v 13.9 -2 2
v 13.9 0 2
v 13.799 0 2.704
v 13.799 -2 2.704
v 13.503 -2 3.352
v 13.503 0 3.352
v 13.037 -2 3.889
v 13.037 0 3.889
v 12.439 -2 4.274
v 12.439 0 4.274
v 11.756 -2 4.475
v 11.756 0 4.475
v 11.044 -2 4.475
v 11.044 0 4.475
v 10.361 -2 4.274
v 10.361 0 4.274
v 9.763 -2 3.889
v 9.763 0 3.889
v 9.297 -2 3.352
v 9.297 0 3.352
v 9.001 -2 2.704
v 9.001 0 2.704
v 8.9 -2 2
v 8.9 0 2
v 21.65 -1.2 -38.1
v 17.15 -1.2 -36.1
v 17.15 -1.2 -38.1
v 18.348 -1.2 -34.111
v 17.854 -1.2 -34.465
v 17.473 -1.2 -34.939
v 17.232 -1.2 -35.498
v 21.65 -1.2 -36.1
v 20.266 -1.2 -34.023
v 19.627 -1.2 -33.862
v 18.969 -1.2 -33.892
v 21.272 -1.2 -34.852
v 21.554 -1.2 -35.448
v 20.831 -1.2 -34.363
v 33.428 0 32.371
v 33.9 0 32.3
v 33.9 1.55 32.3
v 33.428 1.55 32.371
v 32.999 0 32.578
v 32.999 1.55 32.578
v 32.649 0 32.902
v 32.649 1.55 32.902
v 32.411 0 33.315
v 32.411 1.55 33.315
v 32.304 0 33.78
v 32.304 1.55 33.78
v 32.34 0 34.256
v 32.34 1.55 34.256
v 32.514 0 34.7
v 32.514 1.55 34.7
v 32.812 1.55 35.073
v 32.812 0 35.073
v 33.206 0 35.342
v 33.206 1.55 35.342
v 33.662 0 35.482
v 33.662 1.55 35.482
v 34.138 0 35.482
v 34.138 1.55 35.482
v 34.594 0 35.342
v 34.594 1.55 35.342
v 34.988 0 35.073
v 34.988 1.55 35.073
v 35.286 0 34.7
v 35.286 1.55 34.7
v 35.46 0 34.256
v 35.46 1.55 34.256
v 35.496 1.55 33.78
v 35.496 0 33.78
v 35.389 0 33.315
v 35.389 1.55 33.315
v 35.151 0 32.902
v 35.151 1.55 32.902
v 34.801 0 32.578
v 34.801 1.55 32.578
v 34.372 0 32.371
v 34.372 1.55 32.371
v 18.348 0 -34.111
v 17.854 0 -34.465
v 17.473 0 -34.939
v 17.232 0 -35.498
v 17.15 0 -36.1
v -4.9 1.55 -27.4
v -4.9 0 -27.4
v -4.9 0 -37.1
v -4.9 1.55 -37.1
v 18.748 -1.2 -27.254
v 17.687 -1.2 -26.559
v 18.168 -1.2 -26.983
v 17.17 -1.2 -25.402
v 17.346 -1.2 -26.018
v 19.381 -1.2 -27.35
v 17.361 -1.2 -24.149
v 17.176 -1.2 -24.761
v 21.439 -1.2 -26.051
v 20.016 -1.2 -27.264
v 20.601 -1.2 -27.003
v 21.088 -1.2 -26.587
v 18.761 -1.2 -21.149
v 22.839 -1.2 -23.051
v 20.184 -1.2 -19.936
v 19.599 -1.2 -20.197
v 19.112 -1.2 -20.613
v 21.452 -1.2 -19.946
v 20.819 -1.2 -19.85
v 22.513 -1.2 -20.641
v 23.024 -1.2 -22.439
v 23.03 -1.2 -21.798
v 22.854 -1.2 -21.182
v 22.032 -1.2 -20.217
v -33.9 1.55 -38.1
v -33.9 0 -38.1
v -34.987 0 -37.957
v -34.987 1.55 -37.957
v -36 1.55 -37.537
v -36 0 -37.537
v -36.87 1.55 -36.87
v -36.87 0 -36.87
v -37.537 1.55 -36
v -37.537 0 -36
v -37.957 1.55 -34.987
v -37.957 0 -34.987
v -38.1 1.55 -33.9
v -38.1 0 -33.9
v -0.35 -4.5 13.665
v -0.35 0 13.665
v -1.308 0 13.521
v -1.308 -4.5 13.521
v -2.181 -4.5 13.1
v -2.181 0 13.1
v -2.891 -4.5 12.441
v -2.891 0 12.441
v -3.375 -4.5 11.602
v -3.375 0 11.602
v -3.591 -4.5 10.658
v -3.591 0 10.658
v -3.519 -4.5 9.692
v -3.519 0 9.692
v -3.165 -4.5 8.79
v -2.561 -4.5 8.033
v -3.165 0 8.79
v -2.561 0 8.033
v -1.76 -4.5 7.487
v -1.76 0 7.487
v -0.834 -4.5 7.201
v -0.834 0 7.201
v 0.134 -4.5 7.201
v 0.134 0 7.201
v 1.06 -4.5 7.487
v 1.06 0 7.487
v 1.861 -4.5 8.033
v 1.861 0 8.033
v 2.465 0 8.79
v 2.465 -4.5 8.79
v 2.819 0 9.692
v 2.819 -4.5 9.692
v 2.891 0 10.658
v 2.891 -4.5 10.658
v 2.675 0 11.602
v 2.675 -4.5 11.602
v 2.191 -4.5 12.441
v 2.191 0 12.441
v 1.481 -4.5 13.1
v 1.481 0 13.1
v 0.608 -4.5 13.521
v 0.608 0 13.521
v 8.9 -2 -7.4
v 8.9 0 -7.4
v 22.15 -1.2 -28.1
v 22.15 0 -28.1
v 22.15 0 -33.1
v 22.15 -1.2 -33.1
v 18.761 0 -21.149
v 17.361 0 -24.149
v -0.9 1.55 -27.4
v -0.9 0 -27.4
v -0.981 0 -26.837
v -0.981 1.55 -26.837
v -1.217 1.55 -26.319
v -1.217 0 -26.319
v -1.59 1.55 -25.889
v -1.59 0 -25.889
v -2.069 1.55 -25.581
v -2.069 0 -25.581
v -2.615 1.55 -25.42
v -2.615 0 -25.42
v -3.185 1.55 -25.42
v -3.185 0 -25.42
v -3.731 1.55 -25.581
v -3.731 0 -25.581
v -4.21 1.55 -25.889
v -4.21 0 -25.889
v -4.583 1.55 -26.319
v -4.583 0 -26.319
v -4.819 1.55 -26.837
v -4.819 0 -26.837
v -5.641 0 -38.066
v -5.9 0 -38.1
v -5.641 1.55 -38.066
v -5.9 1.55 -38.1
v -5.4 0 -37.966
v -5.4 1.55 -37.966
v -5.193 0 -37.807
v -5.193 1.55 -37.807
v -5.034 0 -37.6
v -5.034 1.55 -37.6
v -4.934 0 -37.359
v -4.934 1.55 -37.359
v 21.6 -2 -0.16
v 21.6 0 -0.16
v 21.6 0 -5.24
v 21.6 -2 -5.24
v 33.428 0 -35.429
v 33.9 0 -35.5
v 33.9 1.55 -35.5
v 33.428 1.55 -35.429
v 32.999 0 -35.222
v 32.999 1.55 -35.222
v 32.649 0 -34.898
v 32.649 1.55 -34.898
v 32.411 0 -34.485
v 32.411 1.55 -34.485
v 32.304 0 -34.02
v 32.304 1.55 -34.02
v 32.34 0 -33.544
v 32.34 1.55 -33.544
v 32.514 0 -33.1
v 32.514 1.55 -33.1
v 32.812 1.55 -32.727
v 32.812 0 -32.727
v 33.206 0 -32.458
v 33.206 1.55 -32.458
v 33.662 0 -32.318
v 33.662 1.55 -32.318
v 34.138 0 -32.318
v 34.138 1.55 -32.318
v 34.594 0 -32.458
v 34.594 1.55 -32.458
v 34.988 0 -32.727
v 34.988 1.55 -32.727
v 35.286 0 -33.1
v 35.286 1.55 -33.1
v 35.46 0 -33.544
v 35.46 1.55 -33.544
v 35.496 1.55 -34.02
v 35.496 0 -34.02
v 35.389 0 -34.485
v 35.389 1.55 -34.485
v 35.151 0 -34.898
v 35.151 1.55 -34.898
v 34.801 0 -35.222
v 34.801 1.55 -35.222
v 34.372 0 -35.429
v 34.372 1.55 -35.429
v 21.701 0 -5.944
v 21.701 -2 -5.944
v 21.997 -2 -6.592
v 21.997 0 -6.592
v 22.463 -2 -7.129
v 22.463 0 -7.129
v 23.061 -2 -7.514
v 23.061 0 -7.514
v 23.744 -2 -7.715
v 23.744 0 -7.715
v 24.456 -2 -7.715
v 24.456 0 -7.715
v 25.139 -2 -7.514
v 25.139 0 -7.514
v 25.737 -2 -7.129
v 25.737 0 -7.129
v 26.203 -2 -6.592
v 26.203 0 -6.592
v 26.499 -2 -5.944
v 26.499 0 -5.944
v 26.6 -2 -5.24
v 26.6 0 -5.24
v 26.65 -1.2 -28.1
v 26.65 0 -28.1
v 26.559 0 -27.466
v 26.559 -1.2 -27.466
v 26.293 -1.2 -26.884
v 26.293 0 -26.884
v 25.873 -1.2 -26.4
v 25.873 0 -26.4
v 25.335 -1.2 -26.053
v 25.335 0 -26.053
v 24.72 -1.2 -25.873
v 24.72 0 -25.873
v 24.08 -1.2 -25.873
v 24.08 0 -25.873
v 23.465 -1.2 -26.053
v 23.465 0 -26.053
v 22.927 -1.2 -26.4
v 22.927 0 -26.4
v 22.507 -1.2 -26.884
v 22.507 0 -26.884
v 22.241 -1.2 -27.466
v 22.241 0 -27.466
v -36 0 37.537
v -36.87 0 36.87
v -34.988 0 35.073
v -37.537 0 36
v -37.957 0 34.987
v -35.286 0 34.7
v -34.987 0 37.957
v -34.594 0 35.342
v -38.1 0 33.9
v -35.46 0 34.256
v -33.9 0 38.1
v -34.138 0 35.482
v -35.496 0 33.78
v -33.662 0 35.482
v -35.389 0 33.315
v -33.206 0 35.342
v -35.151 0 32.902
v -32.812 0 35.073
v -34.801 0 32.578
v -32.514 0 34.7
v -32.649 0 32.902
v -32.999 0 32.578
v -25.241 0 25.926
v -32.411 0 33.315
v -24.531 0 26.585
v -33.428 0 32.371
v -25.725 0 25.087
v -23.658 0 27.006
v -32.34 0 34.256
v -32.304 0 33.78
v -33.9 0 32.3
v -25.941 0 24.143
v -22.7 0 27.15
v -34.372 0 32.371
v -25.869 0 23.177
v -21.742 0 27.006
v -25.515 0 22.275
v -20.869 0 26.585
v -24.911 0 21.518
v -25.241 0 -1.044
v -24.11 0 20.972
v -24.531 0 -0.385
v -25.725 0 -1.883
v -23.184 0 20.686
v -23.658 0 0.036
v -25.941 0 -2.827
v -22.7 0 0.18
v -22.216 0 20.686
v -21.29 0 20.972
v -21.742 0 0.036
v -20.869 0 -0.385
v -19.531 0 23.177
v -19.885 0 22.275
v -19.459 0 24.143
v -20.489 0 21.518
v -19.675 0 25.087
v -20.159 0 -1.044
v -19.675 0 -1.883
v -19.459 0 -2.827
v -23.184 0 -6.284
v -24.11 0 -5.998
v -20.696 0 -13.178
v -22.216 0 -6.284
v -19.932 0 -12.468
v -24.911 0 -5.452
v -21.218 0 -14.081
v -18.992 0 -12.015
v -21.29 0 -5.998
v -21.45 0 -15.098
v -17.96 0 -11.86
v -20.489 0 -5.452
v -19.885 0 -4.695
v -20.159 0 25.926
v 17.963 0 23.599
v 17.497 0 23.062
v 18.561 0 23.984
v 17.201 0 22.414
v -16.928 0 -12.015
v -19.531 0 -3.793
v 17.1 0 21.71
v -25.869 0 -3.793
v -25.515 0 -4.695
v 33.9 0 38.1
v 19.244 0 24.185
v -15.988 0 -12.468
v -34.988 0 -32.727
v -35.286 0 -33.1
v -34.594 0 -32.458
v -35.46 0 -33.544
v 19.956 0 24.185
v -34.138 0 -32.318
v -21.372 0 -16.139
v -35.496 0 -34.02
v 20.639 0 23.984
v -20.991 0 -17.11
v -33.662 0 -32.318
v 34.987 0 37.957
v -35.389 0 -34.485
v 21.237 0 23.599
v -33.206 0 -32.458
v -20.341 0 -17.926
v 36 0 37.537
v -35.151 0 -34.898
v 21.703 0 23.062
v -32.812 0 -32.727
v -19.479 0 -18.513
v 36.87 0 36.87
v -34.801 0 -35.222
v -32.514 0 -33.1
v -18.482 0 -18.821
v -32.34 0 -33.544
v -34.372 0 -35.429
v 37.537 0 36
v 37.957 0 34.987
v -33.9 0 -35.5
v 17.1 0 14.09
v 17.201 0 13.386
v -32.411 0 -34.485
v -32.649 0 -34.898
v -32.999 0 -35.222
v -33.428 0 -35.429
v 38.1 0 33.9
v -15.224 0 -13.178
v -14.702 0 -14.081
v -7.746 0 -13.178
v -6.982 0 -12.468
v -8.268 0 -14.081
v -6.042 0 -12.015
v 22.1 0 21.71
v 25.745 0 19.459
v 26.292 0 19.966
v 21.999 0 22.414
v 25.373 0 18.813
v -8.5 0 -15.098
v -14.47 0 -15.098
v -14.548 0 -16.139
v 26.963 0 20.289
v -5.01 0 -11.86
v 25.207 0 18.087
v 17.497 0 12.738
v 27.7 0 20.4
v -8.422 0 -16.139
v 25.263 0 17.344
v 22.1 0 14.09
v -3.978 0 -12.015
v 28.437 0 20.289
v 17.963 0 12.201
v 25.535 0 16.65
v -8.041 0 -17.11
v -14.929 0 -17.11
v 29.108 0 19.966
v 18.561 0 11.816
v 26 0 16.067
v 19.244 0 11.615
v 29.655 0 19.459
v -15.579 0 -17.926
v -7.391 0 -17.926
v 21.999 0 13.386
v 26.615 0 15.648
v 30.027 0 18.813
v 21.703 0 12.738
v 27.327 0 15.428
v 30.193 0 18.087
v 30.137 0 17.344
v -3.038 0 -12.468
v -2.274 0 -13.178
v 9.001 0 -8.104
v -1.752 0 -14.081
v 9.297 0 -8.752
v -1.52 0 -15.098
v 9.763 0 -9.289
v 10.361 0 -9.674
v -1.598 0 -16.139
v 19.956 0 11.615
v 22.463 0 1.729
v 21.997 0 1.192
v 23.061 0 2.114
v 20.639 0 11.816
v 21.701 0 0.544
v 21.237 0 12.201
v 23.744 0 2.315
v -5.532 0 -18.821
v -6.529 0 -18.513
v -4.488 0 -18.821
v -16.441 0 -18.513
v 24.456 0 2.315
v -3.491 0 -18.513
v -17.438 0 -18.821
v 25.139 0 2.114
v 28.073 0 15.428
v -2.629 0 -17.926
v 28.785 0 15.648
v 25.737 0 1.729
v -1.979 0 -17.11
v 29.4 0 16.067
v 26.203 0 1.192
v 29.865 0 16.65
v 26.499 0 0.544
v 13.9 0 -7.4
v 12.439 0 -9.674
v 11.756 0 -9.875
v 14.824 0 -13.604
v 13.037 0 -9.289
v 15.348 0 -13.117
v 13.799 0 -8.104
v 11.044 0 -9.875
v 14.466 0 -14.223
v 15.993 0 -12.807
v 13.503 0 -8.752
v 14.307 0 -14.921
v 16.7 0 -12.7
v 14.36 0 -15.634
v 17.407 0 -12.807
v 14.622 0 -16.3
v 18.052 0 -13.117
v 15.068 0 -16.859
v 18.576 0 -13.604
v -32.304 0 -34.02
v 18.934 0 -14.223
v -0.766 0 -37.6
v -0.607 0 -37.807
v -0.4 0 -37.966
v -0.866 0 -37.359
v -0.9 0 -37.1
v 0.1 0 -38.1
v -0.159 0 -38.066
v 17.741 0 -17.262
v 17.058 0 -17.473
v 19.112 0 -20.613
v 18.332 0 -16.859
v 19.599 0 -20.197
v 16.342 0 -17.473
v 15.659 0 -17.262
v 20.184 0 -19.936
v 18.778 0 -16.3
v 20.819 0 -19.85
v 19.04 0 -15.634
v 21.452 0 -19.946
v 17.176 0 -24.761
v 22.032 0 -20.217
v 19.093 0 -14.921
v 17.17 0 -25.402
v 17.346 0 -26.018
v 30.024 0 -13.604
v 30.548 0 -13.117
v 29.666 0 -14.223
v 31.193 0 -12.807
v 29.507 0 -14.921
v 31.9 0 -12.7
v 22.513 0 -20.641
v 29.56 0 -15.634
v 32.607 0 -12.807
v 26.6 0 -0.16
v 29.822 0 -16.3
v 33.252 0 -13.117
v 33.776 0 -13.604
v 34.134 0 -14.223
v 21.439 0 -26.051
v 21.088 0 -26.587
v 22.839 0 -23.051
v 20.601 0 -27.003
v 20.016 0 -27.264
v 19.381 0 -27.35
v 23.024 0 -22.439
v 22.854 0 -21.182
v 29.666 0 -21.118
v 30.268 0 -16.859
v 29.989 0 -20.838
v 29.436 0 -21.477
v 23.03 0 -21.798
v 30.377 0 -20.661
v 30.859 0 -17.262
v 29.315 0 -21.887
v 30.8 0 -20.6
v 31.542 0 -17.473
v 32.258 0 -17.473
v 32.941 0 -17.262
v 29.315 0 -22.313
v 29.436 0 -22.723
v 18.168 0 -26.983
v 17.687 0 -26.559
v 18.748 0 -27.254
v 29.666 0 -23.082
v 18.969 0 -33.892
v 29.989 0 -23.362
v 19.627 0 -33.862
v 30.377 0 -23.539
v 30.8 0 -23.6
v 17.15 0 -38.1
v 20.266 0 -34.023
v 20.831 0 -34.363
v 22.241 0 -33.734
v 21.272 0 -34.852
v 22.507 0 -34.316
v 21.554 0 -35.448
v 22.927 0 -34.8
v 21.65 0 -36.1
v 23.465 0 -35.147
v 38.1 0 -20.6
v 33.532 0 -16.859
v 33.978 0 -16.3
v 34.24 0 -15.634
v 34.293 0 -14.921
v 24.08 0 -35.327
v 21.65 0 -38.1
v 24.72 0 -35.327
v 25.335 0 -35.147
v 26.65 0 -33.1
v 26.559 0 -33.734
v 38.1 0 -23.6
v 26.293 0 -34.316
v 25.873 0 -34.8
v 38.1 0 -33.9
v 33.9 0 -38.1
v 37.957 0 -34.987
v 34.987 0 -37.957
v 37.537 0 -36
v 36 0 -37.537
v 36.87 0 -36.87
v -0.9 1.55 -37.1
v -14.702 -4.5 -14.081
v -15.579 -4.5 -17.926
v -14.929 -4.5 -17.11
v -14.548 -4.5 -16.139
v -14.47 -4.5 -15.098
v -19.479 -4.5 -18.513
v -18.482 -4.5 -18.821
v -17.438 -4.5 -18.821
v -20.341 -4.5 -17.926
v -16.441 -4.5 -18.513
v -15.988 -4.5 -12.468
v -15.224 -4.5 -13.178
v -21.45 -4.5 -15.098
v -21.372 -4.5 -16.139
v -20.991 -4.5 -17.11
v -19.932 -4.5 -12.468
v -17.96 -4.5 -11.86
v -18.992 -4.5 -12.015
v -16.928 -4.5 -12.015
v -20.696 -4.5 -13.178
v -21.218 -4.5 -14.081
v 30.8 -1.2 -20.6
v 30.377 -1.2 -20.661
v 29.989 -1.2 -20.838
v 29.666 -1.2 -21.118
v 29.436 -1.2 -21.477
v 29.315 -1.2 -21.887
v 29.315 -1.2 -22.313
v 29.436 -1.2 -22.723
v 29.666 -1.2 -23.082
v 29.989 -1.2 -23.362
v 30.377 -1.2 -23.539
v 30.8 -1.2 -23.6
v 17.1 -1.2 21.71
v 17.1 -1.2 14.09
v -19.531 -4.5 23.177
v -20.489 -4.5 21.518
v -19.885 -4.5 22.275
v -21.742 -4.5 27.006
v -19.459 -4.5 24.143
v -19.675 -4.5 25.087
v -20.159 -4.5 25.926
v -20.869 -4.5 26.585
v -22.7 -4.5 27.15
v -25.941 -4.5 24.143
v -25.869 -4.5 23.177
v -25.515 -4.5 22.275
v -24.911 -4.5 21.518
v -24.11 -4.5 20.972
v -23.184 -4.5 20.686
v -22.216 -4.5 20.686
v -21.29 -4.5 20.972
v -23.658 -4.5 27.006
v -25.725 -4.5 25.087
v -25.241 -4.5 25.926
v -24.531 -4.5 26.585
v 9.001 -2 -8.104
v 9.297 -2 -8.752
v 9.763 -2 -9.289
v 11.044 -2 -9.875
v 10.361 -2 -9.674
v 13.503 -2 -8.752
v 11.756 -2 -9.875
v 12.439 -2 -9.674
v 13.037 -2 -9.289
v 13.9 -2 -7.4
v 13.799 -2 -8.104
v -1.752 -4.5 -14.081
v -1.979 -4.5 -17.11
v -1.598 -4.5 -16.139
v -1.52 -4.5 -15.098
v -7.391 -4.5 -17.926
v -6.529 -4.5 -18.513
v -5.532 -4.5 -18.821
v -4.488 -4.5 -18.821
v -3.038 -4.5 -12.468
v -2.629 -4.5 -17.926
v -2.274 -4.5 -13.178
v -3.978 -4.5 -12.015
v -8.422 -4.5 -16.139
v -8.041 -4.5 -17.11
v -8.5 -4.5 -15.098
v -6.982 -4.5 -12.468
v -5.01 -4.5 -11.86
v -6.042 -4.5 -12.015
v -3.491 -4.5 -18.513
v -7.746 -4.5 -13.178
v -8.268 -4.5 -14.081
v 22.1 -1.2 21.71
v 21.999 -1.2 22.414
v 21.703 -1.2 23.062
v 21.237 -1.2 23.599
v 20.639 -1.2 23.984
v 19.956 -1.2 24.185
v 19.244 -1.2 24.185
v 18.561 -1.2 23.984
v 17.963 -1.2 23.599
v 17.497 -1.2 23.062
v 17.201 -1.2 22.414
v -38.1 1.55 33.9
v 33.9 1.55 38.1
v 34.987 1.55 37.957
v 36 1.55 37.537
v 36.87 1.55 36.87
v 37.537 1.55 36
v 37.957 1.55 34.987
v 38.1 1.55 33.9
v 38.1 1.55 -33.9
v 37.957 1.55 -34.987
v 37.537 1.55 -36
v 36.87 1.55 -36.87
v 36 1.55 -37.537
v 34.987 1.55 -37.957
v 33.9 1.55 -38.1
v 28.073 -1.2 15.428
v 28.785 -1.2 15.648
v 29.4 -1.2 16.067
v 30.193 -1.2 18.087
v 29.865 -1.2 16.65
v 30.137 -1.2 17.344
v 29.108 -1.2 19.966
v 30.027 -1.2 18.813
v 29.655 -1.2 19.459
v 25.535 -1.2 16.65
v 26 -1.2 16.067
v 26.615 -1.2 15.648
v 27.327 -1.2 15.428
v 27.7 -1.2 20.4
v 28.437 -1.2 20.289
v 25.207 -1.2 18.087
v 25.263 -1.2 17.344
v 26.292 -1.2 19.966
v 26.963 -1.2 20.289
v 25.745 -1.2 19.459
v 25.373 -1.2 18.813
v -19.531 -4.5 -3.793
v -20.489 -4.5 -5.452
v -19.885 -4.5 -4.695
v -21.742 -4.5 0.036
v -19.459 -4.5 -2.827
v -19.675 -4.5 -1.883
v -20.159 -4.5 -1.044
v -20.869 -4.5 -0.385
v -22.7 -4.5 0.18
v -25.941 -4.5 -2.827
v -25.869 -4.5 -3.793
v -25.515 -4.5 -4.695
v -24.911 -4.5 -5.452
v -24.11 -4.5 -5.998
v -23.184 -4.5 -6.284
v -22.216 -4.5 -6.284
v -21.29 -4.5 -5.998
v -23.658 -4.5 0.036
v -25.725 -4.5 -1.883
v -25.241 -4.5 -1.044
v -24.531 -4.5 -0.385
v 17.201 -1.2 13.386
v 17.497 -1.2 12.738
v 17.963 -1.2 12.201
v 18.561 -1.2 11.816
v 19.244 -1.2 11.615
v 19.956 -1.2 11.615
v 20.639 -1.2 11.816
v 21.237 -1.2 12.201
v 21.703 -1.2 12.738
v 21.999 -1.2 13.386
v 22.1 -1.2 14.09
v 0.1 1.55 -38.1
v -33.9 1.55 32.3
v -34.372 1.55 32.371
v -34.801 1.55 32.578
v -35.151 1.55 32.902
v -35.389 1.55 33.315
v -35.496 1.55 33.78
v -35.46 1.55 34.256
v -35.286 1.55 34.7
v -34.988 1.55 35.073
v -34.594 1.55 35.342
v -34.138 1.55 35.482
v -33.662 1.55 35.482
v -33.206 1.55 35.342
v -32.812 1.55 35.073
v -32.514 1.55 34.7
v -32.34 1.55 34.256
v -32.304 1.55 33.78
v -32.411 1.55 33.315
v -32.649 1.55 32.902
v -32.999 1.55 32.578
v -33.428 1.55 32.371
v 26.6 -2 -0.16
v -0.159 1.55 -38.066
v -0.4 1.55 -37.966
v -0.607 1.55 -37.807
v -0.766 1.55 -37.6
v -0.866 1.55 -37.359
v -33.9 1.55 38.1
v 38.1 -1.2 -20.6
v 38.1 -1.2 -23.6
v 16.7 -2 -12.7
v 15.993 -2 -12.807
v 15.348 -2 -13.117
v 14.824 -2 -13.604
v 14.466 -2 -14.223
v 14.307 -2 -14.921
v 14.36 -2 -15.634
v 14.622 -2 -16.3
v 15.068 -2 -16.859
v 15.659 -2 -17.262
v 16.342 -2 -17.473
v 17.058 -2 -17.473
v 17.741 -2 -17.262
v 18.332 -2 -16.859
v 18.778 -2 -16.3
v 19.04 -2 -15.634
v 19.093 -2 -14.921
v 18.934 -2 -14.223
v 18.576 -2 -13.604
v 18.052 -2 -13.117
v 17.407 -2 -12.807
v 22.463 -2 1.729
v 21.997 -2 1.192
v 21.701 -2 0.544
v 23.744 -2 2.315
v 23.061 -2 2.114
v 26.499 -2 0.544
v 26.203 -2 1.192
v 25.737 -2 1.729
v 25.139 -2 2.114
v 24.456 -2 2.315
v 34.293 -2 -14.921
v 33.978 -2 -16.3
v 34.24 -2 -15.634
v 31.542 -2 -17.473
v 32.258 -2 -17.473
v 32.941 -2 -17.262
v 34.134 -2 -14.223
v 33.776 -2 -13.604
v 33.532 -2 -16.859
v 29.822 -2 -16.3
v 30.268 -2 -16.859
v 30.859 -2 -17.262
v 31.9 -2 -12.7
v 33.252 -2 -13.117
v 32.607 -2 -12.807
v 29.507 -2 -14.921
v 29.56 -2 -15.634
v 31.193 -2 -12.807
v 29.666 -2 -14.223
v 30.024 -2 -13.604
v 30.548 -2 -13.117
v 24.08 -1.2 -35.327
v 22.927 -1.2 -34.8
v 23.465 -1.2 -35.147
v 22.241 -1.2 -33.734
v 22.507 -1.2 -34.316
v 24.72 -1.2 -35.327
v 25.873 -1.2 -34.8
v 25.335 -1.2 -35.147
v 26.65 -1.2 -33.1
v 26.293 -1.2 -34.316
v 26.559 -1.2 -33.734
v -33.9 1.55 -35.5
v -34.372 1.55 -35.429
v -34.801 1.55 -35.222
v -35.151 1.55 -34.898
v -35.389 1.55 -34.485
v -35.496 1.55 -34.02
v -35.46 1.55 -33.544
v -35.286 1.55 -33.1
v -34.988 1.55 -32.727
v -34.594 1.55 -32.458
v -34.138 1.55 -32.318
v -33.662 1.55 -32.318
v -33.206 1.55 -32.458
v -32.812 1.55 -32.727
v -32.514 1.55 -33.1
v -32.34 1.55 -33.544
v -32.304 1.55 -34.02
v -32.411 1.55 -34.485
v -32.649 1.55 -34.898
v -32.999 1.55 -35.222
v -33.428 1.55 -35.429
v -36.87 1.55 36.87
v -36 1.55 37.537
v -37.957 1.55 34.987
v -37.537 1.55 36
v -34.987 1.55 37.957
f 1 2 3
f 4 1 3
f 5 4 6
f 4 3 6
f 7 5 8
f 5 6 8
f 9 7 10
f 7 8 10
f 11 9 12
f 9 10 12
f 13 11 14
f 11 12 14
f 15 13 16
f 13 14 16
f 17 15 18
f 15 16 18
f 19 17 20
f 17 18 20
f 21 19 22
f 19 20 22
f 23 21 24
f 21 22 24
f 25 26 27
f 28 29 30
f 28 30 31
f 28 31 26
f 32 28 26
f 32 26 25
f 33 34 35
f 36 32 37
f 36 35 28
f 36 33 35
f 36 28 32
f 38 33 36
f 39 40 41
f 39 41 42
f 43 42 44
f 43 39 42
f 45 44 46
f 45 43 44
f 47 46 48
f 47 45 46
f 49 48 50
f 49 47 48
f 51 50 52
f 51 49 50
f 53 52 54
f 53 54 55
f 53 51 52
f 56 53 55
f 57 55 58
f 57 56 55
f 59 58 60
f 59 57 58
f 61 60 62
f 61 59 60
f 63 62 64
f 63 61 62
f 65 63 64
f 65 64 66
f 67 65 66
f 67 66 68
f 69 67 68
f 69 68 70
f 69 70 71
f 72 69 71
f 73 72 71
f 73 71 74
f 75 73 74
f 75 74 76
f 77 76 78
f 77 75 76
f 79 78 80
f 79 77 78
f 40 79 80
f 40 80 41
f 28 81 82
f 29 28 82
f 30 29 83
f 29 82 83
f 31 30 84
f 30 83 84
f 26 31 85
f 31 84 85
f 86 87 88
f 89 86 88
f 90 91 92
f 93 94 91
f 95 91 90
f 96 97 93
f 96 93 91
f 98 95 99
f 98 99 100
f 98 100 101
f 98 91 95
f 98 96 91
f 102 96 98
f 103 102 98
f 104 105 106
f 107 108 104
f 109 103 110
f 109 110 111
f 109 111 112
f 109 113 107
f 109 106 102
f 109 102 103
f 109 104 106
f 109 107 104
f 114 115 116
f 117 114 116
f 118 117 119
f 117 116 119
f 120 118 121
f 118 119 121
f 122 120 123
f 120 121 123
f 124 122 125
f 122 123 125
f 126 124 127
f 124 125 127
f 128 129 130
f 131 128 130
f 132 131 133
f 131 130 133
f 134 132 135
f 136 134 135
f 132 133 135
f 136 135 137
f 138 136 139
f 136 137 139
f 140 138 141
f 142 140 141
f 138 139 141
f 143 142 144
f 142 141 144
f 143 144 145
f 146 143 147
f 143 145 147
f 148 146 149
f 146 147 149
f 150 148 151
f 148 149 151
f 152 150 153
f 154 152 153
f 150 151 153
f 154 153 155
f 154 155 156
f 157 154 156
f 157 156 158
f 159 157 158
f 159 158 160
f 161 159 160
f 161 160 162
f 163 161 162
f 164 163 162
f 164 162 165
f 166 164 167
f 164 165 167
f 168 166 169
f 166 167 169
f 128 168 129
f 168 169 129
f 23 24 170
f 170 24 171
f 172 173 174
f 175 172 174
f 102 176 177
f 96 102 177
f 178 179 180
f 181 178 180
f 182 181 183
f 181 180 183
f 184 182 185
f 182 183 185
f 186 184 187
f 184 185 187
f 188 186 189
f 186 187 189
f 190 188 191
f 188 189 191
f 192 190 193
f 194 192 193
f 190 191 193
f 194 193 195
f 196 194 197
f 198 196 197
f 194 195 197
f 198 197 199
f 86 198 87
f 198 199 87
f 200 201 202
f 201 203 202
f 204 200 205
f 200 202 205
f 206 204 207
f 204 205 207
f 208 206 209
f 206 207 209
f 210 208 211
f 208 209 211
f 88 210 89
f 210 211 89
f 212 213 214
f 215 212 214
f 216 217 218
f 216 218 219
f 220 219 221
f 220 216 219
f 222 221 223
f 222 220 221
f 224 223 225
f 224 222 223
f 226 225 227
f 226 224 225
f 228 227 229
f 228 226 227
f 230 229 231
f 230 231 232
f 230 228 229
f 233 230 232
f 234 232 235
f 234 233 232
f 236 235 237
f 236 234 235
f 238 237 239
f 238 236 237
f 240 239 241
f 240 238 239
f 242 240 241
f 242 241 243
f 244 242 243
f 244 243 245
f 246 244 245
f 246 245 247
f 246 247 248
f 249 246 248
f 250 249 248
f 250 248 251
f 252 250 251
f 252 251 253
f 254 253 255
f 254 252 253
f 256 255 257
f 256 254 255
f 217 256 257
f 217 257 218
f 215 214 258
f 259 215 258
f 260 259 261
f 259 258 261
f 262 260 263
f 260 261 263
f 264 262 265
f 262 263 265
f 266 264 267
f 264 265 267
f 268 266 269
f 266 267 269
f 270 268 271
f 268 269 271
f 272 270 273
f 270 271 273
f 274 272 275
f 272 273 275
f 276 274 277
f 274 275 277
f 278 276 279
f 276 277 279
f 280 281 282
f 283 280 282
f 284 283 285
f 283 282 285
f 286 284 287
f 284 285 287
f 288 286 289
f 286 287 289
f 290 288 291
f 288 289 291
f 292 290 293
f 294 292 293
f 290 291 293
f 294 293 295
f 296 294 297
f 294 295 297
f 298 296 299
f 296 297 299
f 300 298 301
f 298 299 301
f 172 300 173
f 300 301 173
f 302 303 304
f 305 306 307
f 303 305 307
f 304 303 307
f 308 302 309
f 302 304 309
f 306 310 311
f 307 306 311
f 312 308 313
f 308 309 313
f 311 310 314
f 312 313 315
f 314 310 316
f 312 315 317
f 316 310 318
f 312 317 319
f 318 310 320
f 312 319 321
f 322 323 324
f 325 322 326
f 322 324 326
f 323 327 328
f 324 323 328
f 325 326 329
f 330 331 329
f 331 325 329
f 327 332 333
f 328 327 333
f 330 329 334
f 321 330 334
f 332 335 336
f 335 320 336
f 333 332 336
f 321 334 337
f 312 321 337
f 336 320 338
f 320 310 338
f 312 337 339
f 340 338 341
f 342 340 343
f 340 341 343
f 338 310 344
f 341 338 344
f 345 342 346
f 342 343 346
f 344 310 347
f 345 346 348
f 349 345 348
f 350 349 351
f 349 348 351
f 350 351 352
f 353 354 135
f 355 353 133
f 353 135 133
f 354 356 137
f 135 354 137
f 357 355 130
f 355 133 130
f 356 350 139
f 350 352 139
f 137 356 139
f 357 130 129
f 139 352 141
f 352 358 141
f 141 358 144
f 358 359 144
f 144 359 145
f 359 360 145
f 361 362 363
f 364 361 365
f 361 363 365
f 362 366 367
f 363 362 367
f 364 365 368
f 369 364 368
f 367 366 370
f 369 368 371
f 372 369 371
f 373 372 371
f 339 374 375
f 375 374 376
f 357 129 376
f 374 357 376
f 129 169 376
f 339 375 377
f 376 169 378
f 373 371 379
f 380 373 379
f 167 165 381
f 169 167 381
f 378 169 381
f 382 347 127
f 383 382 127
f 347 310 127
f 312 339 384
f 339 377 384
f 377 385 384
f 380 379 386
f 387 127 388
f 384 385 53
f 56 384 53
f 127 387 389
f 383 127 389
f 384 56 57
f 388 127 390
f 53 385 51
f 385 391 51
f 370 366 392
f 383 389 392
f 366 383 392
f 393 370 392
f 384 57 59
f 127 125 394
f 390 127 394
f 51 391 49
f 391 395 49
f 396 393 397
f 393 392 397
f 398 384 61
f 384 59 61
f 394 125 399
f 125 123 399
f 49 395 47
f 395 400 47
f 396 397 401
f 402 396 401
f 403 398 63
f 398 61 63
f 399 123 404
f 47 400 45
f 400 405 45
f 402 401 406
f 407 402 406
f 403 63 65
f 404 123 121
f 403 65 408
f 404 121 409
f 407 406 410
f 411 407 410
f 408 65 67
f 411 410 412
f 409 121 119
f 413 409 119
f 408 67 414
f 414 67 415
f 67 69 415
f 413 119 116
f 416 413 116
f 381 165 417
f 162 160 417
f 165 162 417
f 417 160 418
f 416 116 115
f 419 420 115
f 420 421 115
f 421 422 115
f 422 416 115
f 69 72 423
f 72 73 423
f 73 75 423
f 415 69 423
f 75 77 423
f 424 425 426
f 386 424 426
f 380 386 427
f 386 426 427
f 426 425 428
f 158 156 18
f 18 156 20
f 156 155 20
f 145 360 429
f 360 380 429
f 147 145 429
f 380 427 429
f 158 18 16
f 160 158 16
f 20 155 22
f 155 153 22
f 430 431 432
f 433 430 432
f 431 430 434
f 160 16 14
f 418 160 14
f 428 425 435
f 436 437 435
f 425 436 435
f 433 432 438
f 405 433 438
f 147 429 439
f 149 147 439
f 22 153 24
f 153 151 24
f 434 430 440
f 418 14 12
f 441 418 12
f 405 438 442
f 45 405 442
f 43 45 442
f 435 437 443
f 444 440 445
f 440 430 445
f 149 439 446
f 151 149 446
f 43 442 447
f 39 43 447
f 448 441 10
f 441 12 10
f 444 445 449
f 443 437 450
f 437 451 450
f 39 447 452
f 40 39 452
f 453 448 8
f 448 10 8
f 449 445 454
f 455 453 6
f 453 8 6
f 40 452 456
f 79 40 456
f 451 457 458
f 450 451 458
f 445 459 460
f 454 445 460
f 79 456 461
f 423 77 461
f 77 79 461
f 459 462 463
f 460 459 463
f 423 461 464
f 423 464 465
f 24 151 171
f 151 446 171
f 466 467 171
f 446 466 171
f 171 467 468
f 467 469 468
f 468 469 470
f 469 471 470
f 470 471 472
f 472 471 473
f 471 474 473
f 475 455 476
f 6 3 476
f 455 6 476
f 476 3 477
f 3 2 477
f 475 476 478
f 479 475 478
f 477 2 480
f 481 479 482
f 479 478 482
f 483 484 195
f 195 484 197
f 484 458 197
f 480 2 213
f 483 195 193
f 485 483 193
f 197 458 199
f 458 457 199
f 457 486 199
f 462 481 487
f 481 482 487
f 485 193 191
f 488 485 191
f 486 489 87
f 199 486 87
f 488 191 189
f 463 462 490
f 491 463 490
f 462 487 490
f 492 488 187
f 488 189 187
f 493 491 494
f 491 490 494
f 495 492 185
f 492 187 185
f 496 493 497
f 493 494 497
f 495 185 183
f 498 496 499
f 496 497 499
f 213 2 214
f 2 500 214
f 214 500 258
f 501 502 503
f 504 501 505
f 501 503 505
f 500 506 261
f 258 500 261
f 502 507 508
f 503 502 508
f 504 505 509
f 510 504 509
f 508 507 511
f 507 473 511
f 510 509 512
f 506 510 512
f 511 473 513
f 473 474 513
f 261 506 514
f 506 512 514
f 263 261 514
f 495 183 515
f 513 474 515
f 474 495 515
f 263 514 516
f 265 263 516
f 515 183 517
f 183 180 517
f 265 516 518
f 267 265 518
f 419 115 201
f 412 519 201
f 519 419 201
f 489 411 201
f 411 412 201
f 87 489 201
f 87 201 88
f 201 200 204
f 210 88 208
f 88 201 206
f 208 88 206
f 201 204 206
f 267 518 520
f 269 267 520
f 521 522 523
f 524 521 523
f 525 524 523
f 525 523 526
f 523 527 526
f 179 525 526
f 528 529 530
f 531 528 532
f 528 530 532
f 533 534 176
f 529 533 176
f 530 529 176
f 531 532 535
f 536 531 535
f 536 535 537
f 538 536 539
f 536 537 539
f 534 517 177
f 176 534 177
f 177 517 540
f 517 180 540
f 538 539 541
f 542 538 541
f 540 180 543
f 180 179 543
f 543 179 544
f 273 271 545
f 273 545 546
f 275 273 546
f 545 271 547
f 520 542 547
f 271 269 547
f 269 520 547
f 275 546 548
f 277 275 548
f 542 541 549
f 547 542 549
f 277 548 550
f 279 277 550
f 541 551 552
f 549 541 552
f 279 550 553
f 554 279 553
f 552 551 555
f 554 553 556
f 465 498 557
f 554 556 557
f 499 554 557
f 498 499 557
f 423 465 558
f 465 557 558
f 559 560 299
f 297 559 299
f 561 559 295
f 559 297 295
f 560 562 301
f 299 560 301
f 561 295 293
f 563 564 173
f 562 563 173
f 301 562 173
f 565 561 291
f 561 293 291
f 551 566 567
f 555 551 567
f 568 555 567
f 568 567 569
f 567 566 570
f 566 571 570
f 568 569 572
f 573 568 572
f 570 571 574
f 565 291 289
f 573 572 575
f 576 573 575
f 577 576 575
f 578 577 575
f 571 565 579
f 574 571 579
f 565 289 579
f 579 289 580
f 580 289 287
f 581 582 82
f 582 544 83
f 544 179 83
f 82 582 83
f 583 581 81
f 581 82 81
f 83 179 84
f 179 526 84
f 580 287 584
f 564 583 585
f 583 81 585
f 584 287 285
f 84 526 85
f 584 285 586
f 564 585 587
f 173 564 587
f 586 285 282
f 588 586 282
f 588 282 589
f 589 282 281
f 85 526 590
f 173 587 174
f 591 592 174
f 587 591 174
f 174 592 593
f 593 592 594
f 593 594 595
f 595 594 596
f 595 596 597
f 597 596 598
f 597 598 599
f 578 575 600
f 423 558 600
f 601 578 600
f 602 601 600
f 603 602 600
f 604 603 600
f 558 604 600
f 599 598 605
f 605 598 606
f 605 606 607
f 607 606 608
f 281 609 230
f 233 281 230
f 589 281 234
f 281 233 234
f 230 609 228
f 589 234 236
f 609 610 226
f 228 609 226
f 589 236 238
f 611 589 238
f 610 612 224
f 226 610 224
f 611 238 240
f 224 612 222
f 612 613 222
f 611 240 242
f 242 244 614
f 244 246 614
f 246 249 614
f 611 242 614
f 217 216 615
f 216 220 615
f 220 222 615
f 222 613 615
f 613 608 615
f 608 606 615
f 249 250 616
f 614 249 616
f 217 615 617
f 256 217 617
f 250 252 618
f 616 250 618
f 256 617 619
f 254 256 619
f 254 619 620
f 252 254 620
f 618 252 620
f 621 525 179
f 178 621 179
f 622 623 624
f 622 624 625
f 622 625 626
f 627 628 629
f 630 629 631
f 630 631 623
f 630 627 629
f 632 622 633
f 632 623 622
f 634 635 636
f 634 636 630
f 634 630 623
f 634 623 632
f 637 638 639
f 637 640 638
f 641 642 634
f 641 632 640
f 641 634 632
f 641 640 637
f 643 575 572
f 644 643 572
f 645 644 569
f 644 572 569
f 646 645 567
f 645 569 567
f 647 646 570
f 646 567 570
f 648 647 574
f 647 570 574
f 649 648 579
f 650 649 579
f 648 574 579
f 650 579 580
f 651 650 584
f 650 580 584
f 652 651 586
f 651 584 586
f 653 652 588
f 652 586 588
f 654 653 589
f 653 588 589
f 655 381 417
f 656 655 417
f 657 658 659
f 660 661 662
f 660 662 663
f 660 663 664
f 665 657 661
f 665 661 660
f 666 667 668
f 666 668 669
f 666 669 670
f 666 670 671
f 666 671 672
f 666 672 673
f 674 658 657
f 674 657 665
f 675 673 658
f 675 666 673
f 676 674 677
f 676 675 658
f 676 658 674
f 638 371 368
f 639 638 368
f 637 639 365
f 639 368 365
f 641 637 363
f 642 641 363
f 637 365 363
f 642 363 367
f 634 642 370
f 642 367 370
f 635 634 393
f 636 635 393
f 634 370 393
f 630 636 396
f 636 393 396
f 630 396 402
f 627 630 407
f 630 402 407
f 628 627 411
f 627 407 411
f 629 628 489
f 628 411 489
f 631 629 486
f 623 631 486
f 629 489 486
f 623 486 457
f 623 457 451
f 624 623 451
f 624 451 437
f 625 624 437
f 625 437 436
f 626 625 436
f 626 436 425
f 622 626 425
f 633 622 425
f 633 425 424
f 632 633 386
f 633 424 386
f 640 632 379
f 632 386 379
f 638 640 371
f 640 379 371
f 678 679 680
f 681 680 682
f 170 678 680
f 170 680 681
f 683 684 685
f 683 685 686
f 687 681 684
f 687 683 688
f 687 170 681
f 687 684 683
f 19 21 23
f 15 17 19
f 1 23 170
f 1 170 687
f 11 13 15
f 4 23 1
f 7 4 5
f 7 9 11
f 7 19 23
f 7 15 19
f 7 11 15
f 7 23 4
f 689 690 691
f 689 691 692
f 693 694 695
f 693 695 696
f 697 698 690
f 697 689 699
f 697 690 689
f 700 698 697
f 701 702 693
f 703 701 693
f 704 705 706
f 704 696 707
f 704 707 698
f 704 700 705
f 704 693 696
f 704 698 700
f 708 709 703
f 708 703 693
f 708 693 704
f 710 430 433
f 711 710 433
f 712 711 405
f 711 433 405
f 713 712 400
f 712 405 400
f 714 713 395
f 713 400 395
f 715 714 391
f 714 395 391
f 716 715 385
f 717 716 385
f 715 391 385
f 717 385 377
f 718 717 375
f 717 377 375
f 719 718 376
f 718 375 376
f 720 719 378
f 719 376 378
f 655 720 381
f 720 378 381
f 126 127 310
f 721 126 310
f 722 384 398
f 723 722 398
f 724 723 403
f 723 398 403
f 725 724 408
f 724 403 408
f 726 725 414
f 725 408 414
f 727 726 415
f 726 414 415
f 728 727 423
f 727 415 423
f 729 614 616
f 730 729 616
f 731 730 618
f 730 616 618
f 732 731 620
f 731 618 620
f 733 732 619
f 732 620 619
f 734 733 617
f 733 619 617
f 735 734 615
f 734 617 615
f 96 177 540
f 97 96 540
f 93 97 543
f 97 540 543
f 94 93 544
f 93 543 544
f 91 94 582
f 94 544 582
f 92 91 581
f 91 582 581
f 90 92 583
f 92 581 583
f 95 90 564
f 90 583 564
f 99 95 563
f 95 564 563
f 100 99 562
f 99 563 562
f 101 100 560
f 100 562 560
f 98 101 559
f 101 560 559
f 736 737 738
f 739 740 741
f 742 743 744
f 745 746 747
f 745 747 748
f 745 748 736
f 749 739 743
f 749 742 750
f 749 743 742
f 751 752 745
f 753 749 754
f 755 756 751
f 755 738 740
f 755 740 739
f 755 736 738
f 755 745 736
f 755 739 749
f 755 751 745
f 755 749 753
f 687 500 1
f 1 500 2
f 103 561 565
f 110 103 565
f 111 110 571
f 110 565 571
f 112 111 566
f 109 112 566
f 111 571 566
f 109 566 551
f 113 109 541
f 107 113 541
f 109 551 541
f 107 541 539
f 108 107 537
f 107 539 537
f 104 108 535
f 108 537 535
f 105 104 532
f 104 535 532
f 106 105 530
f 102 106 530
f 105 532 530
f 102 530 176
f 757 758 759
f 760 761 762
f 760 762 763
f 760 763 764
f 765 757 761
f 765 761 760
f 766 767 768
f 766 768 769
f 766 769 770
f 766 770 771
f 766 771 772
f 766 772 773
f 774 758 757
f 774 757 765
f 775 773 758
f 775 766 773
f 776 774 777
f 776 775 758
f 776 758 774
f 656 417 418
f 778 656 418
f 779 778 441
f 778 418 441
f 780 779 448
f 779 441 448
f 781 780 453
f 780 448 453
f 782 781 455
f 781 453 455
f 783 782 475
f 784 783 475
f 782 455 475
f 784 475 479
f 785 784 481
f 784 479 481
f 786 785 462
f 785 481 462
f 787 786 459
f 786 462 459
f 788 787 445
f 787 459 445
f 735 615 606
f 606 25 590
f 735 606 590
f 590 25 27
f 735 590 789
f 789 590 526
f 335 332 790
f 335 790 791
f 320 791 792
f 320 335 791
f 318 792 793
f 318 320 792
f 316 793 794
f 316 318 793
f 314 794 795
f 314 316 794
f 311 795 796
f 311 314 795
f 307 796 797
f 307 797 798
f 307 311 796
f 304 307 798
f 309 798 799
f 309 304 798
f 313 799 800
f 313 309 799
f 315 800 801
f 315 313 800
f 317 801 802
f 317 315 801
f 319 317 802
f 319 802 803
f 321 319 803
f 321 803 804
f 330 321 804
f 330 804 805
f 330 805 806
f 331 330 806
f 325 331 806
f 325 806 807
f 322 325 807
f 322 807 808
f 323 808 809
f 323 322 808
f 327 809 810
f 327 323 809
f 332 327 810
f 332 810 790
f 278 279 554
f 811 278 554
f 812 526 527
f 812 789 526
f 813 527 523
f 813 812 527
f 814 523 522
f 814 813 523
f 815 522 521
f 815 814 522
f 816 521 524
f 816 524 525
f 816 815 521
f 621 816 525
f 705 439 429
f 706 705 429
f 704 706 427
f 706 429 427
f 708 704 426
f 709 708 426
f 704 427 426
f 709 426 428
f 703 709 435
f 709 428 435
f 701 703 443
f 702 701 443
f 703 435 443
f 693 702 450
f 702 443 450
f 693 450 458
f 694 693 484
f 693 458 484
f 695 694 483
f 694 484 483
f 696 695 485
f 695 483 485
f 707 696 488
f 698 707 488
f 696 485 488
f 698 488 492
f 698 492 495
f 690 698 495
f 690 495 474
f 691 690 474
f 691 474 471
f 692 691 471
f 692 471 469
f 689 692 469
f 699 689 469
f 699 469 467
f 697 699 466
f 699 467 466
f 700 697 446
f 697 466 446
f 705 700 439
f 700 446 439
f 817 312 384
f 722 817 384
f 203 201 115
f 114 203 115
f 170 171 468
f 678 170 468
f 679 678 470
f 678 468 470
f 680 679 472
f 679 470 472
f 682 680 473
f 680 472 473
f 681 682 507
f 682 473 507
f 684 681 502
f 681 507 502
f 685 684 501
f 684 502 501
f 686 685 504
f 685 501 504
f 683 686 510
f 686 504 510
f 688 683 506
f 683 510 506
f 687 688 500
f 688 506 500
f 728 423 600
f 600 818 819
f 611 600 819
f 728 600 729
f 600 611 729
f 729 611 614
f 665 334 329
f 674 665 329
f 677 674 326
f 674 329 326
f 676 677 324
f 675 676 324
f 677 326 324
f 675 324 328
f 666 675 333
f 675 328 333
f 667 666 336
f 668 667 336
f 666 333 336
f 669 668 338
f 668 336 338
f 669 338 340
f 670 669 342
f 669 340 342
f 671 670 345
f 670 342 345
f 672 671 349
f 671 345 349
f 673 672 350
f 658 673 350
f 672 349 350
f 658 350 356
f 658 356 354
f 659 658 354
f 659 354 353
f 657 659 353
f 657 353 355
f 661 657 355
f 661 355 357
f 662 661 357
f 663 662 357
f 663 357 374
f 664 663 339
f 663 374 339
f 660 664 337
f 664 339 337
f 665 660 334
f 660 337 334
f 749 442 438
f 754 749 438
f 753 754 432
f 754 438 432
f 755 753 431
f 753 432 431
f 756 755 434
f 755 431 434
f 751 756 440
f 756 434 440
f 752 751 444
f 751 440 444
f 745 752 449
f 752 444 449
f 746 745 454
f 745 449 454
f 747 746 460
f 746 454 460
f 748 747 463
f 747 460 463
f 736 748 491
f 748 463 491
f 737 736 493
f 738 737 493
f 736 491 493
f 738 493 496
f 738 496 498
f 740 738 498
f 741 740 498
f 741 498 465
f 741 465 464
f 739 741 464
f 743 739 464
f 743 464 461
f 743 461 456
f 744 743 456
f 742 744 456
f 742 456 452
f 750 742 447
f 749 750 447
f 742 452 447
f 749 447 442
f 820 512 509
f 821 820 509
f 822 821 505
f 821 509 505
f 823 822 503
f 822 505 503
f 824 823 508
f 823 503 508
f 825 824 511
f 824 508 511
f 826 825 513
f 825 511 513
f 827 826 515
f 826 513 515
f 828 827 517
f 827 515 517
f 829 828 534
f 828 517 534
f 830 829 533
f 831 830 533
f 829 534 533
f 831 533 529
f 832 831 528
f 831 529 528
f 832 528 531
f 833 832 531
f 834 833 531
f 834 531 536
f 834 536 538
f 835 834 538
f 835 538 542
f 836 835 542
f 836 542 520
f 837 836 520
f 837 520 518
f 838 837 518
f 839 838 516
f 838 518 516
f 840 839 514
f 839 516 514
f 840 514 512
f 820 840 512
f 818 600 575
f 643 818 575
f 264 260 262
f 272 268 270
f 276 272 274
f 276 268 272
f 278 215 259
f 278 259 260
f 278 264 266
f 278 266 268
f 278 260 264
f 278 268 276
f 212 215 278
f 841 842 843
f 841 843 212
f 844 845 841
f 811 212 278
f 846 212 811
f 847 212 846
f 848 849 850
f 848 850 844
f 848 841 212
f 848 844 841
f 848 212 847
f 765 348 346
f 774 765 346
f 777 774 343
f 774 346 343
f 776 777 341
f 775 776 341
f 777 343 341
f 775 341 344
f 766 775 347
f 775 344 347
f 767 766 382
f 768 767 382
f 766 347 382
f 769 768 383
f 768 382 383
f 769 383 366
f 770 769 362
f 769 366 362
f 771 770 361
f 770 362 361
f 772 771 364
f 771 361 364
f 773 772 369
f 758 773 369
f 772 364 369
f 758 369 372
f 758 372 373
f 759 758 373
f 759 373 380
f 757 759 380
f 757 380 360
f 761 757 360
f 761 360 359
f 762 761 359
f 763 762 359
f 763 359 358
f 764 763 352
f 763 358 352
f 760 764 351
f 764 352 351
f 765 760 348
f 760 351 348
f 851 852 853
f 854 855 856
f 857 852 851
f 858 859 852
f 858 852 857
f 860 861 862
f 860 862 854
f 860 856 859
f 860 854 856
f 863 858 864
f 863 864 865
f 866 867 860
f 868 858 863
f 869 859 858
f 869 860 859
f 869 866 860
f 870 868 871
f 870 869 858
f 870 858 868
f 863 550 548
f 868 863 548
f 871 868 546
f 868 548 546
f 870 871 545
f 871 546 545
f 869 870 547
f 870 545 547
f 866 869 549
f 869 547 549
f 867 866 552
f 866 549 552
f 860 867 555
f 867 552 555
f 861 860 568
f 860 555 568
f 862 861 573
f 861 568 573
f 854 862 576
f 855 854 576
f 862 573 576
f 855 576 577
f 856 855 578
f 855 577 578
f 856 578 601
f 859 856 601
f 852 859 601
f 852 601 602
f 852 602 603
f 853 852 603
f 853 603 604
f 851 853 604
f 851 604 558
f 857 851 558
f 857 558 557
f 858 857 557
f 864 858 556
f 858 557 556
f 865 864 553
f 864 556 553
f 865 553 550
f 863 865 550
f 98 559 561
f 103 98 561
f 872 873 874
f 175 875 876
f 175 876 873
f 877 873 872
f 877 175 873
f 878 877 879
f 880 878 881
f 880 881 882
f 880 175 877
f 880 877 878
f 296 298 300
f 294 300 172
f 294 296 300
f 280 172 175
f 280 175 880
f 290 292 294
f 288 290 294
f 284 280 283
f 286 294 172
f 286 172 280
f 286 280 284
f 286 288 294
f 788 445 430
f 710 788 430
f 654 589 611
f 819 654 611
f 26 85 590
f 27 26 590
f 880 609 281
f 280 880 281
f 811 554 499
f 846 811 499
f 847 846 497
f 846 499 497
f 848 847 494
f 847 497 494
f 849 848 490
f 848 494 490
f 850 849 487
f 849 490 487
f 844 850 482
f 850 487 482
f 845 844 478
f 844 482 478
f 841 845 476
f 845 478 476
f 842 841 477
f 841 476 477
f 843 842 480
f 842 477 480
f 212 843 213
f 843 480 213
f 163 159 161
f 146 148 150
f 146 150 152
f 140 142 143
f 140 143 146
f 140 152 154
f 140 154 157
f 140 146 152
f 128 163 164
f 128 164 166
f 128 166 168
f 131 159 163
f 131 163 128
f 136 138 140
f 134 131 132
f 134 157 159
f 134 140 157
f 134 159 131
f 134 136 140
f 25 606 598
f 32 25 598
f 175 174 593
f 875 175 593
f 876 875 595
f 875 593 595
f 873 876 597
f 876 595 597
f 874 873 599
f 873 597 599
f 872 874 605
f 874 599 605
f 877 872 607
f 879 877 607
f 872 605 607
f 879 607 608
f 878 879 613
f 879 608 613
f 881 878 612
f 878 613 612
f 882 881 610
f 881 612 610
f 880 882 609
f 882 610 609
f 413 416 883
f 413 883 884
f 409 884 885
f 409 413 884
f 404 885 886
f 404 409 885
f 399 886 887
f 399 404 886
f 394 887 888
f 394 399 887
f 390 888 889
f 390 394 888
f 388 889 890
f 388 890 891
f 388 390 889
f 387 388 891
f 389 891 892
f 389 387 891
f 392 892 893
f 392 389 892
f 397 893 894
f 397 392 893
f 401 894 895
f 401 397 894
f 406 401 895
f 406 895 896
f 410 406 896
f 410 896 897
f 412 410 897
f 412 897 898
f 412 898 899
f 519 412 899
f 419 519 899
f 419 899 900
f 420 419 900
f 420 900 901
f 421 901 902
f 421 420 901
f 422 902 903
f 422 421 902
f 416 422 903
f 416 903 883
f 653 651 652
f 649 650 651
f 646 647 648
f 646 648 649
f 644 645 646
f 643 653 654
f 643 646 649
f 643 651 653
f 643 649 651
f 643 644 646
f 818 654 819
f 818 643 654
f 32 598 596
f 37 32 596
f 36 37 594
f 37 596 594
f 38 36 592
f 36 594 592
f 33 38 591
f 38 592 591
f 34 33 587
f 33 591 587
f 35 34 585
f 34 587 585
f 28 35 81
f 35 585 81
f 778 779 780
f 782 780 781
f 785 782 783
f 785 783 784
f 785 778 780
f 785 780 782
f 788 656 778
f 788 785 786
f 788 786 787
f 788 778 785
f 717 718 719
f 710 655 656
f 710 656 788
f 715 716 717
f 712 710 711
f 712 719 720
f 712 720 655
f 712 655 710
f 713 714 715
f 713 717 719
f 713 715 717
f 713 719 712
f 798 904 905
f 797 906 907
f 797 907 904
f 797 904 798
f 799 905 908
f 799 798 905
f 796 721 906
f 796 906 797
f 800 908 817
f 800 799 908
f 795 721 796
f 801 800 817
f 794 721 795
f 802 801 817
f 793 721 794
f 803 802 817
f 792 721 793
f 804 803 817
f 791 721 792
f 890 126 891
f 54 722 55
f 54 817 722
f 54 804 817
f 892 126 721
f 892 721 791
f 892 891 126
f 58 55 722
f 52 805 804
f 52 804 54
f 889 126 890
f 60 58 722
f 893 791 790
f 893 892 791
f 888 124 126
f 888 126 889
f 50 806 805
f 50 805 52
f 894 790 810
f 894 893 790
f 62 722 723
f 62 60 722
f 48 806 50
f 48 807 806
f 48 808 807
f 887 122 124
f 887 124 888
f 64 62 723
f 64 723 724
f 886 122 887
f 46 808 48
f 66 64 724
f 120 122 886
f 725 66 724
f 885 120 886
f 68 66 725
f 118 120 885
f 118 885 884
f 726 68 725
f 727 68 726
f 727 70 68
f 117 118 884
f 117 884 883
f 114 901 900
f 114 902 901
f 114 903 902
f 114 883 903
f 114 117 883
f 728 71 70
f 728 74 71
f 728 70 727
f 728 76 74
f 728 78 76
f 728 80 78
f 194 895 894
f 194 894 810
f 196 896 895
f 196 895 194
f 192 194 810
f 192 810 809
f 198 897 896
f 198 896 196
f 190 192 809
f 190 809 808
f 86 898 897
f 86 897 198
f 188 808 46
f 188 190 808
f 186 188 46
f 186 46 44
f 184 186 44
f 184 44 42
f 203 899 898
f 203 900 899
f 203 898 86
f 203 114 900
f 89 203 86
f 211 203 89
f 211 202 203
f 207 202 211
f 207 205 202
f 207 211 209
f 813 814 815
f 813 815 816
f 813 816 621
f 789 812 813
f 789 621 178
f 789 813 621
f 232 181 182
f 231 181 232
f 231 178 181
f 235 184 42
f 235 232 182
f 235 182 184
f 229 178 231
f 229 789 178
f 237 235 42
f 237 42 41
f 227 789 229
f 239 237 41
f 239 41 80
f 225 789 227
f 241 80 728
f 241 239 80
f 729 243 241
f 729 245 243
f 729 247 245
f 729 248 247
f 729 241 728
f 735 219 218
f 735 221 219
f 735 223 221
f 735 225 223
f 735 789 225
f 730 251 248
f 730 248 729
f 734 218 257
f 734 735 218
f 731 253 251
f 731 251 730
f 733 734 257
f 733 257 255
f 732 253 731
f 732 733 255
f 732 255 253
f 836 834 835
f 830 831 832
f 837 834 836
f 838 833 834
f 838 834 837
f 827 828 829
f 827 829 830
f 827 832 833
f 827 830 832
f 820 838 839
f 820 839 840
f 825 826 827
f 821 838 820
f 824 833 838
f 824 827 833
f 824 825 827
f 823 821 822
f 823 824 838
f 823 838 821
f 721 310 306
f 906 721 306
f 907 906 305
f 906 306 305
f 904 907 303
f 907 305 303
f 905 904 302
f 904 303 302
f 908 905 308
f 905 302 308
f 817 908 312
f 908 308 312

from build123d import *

# Parameters (mm, degrees)
BASE_PLATE_R    = 1.6
EXTRUDE_1_DEPTH = 1.55
FILLET_1_R      = 1
SKETCH_1_R      = 3.25
SKETCH_1_R_2    = 3.5
EXTRUDE_2_DEPTH = 4.5
SKETCH_1_3_R    = 2.4
EXTRUDE_3_DEPTH = 2
SKETCH_1_4_R    = 2.5
EXTRUDE_4_DEPTH = 1.2


with BuildPart() as part:
    # Base plate → 凸台-拉伸1 (new body)
    with BuildSketch(Plane(origin=(0, 0, 0), x_dir=(1, 0, 0), z_dir=(0, 1, 0))):
        with BuildLine():
            ThreePointArc((-38.1, -33.9), (-36.869848481, -36.869848481), (-33.9, -38.1))
            Line((-33.9, -38.1), (33.9, -38.1))
            ThreePointArc((33.9, -38.1), (36.869848481, -36.869848481), (38.1, -33.9))
            Line((38.1, -33.9), (38.1, 33.9))
            ThreePointArc((38.1, 33.9), (36.869848481, 36.869848481), (33.9, 38.1))
            Line((33.9, 38.1), (-0.9, 38.1))
            Line((-0.9, 38.1), (-0.9, 27.4))
            ThreePointArc((-0.9, 27.4), (-2.9, 25.4), (-4.9, 27.4))
            Line((-4.9, 27.4), (-4.9, 38.1))
            Line((-4.9, 38.1), (-33.9, 38.1))
            ThreePointArc((-33.9, 38.1), (-36.869848481, 36.869848481), (-38.1, 33.9))
            Line((-38.1, 33.9), (-38.1, -33.9))
        make_face()
        with Locations((-33.9, -33.9)):
            Circle(BASE_PLATE_R, mode=Mode.SUBTRACT)
        with Locations((33.9, -33.9)):
            Circle(BASE_PLATE_R, mode=Mode.SUBTRACT)
        with Locations((-33.9, 33.9)):
            Circle(BASE_PLATE_R, mode=Mode.SUBTRACT)
        with Locations((33.9, 33.9)):
            Circle(BASE_PLATE_R, mode=Mode.SUBTRACT)
    extrude(amount=EXTRUDE_1_DEPTH)

    # 圆角1
    fillet_1_edges = [part.edges().sort_by_distance(p)[0] for p in [
        (-4.9, 0.775, -38.1),
        (-0.9, 0.775, -38.1),
    ]]
    fillet(fillet_1_edges, radius=FILLET_1_R)

    # 草图1 → 凸台-拉伸2 (add)
    with BuildSketch(Plane.XZ):
        with Locations((-22.7, 23.9)):
            Circle(SKETCH_1_R)
        with Locations((-0.35, 10.415)):
            Circle(SKETCH_1_R)
        with Locations((-22.7, -3.07)):
            Circle(SKETCH_1_R)
        with Locations((-17.96, -15.36)):
            Circle(SKETCH_1_R_2)
        with Locations((-5.01, -15.36)):
            Circle(SKETCH_1_R_2)
    extrude(amount=EXTRUDE_2_DEPTH)

    # 草图1<3> → 凸台-拉伸3 (add)
    with BuildSketch(Plane.XZ):
        with BuildLine():
            Line((13.9, -7.4), (13.9, 2))
            ThreePointArc((13.9, 2), (11.4, 4.5), (8.9, 2))
            Line((8.9, 2), (8.9, -7.4))
            ThreePointArc((8.9, -7.4), (11.4, -9.9), (13.9, -7.4))
        make_face()
        with BuildLine():
            Line((26.6, -5.24), (26.6, -0.16))
            ThreePointArc((26.6, -0.16), (24.1, 2.34), (21.6, -0.16))
            Line((21.6, -0.16), (21.6, -5.24))
            ThreePointArc((21.6, -5.24), (24.1, -7.74), (26.6, -5.24))
        make_face()
        with Locations((16.7, -15.1)):
            Circle(SKETCH_1_3_R)
        with Locations((31.9, -15.1)):
            Circle(SKETCH_1_3_R)
    extrude(amount=EXTRUDE_3_DEPTH)

    # 草图1<4> → 凸台-拉伸4 (add)
    with BuildSketch(Plane.XZ):
        with BuildLine():
            Line((22.1, 14.09), (22.1, 21.71))
            ThreePointArc((22.1, 21.71), (19.6, 24.21), (17.1, 21.71))
            Line((17.1, 21.71), (17.1, 14.09))
            ThreePointArc((17.1, 14.09), (19.6, 11.59), (22.1, 14.09))
        make_face()
        with BuildLine():
            Line((38.1, -20.6), (30.8, -20.6))
            ThreePointArc((30.8, -20.6), (29.3, -22.1), (30.8, -23.6))
            Line((30.8, -23.6), (38.1, -23.6))
            Line((38.1, -23.6), (38.1, -20.6))
        make_face()
        with BuildLine():
            Line((26.65, -33.1), (26.65, -28.1))
            ThreePointArc((26.65, -28.1), (24.4, -25.85), (22.15, -28.1))
            Line((22.15, -28.1), (22.15, -33.1))
            ThreePointArc((22.15, -33.1), (24.4, -35.35), (26.65, -33.1))
        make_face()
        with BuildLine():
            Line((21.438912065, -26.051492297), (22.838912065, -23.051492297))
            ThreePointArc((22.838912065, -23.051492297), (21.751492297, -20.061087935), (18.761087935, -21.148507703))
            Line((18.761087935, -21.148507703), (17.361087935, -24.148507703))
            ThreePointArc((17.361087935, -24.148507703), (18.448507703, -27.138912065), (21.438912065, -26.051492297))
        make_face()
        with BuildLine():
            Line((21.65, -38.1), (21.65, -36.1))
            ThreePointArc((21.65, -36.1), (19.4, -33.85), (17.15, -36.1))
            Line((17.15, -36.1), (17.15, -38.1))
            Line((17.15, -38.1), (21.65, -38.1))
        make_face()
        with Locations((27.7, 17.9)):
            Circle(SKETCH_1_4_R)
    extrude(amount=EXTRUDE_4_DEPTH)


solid = part.part
